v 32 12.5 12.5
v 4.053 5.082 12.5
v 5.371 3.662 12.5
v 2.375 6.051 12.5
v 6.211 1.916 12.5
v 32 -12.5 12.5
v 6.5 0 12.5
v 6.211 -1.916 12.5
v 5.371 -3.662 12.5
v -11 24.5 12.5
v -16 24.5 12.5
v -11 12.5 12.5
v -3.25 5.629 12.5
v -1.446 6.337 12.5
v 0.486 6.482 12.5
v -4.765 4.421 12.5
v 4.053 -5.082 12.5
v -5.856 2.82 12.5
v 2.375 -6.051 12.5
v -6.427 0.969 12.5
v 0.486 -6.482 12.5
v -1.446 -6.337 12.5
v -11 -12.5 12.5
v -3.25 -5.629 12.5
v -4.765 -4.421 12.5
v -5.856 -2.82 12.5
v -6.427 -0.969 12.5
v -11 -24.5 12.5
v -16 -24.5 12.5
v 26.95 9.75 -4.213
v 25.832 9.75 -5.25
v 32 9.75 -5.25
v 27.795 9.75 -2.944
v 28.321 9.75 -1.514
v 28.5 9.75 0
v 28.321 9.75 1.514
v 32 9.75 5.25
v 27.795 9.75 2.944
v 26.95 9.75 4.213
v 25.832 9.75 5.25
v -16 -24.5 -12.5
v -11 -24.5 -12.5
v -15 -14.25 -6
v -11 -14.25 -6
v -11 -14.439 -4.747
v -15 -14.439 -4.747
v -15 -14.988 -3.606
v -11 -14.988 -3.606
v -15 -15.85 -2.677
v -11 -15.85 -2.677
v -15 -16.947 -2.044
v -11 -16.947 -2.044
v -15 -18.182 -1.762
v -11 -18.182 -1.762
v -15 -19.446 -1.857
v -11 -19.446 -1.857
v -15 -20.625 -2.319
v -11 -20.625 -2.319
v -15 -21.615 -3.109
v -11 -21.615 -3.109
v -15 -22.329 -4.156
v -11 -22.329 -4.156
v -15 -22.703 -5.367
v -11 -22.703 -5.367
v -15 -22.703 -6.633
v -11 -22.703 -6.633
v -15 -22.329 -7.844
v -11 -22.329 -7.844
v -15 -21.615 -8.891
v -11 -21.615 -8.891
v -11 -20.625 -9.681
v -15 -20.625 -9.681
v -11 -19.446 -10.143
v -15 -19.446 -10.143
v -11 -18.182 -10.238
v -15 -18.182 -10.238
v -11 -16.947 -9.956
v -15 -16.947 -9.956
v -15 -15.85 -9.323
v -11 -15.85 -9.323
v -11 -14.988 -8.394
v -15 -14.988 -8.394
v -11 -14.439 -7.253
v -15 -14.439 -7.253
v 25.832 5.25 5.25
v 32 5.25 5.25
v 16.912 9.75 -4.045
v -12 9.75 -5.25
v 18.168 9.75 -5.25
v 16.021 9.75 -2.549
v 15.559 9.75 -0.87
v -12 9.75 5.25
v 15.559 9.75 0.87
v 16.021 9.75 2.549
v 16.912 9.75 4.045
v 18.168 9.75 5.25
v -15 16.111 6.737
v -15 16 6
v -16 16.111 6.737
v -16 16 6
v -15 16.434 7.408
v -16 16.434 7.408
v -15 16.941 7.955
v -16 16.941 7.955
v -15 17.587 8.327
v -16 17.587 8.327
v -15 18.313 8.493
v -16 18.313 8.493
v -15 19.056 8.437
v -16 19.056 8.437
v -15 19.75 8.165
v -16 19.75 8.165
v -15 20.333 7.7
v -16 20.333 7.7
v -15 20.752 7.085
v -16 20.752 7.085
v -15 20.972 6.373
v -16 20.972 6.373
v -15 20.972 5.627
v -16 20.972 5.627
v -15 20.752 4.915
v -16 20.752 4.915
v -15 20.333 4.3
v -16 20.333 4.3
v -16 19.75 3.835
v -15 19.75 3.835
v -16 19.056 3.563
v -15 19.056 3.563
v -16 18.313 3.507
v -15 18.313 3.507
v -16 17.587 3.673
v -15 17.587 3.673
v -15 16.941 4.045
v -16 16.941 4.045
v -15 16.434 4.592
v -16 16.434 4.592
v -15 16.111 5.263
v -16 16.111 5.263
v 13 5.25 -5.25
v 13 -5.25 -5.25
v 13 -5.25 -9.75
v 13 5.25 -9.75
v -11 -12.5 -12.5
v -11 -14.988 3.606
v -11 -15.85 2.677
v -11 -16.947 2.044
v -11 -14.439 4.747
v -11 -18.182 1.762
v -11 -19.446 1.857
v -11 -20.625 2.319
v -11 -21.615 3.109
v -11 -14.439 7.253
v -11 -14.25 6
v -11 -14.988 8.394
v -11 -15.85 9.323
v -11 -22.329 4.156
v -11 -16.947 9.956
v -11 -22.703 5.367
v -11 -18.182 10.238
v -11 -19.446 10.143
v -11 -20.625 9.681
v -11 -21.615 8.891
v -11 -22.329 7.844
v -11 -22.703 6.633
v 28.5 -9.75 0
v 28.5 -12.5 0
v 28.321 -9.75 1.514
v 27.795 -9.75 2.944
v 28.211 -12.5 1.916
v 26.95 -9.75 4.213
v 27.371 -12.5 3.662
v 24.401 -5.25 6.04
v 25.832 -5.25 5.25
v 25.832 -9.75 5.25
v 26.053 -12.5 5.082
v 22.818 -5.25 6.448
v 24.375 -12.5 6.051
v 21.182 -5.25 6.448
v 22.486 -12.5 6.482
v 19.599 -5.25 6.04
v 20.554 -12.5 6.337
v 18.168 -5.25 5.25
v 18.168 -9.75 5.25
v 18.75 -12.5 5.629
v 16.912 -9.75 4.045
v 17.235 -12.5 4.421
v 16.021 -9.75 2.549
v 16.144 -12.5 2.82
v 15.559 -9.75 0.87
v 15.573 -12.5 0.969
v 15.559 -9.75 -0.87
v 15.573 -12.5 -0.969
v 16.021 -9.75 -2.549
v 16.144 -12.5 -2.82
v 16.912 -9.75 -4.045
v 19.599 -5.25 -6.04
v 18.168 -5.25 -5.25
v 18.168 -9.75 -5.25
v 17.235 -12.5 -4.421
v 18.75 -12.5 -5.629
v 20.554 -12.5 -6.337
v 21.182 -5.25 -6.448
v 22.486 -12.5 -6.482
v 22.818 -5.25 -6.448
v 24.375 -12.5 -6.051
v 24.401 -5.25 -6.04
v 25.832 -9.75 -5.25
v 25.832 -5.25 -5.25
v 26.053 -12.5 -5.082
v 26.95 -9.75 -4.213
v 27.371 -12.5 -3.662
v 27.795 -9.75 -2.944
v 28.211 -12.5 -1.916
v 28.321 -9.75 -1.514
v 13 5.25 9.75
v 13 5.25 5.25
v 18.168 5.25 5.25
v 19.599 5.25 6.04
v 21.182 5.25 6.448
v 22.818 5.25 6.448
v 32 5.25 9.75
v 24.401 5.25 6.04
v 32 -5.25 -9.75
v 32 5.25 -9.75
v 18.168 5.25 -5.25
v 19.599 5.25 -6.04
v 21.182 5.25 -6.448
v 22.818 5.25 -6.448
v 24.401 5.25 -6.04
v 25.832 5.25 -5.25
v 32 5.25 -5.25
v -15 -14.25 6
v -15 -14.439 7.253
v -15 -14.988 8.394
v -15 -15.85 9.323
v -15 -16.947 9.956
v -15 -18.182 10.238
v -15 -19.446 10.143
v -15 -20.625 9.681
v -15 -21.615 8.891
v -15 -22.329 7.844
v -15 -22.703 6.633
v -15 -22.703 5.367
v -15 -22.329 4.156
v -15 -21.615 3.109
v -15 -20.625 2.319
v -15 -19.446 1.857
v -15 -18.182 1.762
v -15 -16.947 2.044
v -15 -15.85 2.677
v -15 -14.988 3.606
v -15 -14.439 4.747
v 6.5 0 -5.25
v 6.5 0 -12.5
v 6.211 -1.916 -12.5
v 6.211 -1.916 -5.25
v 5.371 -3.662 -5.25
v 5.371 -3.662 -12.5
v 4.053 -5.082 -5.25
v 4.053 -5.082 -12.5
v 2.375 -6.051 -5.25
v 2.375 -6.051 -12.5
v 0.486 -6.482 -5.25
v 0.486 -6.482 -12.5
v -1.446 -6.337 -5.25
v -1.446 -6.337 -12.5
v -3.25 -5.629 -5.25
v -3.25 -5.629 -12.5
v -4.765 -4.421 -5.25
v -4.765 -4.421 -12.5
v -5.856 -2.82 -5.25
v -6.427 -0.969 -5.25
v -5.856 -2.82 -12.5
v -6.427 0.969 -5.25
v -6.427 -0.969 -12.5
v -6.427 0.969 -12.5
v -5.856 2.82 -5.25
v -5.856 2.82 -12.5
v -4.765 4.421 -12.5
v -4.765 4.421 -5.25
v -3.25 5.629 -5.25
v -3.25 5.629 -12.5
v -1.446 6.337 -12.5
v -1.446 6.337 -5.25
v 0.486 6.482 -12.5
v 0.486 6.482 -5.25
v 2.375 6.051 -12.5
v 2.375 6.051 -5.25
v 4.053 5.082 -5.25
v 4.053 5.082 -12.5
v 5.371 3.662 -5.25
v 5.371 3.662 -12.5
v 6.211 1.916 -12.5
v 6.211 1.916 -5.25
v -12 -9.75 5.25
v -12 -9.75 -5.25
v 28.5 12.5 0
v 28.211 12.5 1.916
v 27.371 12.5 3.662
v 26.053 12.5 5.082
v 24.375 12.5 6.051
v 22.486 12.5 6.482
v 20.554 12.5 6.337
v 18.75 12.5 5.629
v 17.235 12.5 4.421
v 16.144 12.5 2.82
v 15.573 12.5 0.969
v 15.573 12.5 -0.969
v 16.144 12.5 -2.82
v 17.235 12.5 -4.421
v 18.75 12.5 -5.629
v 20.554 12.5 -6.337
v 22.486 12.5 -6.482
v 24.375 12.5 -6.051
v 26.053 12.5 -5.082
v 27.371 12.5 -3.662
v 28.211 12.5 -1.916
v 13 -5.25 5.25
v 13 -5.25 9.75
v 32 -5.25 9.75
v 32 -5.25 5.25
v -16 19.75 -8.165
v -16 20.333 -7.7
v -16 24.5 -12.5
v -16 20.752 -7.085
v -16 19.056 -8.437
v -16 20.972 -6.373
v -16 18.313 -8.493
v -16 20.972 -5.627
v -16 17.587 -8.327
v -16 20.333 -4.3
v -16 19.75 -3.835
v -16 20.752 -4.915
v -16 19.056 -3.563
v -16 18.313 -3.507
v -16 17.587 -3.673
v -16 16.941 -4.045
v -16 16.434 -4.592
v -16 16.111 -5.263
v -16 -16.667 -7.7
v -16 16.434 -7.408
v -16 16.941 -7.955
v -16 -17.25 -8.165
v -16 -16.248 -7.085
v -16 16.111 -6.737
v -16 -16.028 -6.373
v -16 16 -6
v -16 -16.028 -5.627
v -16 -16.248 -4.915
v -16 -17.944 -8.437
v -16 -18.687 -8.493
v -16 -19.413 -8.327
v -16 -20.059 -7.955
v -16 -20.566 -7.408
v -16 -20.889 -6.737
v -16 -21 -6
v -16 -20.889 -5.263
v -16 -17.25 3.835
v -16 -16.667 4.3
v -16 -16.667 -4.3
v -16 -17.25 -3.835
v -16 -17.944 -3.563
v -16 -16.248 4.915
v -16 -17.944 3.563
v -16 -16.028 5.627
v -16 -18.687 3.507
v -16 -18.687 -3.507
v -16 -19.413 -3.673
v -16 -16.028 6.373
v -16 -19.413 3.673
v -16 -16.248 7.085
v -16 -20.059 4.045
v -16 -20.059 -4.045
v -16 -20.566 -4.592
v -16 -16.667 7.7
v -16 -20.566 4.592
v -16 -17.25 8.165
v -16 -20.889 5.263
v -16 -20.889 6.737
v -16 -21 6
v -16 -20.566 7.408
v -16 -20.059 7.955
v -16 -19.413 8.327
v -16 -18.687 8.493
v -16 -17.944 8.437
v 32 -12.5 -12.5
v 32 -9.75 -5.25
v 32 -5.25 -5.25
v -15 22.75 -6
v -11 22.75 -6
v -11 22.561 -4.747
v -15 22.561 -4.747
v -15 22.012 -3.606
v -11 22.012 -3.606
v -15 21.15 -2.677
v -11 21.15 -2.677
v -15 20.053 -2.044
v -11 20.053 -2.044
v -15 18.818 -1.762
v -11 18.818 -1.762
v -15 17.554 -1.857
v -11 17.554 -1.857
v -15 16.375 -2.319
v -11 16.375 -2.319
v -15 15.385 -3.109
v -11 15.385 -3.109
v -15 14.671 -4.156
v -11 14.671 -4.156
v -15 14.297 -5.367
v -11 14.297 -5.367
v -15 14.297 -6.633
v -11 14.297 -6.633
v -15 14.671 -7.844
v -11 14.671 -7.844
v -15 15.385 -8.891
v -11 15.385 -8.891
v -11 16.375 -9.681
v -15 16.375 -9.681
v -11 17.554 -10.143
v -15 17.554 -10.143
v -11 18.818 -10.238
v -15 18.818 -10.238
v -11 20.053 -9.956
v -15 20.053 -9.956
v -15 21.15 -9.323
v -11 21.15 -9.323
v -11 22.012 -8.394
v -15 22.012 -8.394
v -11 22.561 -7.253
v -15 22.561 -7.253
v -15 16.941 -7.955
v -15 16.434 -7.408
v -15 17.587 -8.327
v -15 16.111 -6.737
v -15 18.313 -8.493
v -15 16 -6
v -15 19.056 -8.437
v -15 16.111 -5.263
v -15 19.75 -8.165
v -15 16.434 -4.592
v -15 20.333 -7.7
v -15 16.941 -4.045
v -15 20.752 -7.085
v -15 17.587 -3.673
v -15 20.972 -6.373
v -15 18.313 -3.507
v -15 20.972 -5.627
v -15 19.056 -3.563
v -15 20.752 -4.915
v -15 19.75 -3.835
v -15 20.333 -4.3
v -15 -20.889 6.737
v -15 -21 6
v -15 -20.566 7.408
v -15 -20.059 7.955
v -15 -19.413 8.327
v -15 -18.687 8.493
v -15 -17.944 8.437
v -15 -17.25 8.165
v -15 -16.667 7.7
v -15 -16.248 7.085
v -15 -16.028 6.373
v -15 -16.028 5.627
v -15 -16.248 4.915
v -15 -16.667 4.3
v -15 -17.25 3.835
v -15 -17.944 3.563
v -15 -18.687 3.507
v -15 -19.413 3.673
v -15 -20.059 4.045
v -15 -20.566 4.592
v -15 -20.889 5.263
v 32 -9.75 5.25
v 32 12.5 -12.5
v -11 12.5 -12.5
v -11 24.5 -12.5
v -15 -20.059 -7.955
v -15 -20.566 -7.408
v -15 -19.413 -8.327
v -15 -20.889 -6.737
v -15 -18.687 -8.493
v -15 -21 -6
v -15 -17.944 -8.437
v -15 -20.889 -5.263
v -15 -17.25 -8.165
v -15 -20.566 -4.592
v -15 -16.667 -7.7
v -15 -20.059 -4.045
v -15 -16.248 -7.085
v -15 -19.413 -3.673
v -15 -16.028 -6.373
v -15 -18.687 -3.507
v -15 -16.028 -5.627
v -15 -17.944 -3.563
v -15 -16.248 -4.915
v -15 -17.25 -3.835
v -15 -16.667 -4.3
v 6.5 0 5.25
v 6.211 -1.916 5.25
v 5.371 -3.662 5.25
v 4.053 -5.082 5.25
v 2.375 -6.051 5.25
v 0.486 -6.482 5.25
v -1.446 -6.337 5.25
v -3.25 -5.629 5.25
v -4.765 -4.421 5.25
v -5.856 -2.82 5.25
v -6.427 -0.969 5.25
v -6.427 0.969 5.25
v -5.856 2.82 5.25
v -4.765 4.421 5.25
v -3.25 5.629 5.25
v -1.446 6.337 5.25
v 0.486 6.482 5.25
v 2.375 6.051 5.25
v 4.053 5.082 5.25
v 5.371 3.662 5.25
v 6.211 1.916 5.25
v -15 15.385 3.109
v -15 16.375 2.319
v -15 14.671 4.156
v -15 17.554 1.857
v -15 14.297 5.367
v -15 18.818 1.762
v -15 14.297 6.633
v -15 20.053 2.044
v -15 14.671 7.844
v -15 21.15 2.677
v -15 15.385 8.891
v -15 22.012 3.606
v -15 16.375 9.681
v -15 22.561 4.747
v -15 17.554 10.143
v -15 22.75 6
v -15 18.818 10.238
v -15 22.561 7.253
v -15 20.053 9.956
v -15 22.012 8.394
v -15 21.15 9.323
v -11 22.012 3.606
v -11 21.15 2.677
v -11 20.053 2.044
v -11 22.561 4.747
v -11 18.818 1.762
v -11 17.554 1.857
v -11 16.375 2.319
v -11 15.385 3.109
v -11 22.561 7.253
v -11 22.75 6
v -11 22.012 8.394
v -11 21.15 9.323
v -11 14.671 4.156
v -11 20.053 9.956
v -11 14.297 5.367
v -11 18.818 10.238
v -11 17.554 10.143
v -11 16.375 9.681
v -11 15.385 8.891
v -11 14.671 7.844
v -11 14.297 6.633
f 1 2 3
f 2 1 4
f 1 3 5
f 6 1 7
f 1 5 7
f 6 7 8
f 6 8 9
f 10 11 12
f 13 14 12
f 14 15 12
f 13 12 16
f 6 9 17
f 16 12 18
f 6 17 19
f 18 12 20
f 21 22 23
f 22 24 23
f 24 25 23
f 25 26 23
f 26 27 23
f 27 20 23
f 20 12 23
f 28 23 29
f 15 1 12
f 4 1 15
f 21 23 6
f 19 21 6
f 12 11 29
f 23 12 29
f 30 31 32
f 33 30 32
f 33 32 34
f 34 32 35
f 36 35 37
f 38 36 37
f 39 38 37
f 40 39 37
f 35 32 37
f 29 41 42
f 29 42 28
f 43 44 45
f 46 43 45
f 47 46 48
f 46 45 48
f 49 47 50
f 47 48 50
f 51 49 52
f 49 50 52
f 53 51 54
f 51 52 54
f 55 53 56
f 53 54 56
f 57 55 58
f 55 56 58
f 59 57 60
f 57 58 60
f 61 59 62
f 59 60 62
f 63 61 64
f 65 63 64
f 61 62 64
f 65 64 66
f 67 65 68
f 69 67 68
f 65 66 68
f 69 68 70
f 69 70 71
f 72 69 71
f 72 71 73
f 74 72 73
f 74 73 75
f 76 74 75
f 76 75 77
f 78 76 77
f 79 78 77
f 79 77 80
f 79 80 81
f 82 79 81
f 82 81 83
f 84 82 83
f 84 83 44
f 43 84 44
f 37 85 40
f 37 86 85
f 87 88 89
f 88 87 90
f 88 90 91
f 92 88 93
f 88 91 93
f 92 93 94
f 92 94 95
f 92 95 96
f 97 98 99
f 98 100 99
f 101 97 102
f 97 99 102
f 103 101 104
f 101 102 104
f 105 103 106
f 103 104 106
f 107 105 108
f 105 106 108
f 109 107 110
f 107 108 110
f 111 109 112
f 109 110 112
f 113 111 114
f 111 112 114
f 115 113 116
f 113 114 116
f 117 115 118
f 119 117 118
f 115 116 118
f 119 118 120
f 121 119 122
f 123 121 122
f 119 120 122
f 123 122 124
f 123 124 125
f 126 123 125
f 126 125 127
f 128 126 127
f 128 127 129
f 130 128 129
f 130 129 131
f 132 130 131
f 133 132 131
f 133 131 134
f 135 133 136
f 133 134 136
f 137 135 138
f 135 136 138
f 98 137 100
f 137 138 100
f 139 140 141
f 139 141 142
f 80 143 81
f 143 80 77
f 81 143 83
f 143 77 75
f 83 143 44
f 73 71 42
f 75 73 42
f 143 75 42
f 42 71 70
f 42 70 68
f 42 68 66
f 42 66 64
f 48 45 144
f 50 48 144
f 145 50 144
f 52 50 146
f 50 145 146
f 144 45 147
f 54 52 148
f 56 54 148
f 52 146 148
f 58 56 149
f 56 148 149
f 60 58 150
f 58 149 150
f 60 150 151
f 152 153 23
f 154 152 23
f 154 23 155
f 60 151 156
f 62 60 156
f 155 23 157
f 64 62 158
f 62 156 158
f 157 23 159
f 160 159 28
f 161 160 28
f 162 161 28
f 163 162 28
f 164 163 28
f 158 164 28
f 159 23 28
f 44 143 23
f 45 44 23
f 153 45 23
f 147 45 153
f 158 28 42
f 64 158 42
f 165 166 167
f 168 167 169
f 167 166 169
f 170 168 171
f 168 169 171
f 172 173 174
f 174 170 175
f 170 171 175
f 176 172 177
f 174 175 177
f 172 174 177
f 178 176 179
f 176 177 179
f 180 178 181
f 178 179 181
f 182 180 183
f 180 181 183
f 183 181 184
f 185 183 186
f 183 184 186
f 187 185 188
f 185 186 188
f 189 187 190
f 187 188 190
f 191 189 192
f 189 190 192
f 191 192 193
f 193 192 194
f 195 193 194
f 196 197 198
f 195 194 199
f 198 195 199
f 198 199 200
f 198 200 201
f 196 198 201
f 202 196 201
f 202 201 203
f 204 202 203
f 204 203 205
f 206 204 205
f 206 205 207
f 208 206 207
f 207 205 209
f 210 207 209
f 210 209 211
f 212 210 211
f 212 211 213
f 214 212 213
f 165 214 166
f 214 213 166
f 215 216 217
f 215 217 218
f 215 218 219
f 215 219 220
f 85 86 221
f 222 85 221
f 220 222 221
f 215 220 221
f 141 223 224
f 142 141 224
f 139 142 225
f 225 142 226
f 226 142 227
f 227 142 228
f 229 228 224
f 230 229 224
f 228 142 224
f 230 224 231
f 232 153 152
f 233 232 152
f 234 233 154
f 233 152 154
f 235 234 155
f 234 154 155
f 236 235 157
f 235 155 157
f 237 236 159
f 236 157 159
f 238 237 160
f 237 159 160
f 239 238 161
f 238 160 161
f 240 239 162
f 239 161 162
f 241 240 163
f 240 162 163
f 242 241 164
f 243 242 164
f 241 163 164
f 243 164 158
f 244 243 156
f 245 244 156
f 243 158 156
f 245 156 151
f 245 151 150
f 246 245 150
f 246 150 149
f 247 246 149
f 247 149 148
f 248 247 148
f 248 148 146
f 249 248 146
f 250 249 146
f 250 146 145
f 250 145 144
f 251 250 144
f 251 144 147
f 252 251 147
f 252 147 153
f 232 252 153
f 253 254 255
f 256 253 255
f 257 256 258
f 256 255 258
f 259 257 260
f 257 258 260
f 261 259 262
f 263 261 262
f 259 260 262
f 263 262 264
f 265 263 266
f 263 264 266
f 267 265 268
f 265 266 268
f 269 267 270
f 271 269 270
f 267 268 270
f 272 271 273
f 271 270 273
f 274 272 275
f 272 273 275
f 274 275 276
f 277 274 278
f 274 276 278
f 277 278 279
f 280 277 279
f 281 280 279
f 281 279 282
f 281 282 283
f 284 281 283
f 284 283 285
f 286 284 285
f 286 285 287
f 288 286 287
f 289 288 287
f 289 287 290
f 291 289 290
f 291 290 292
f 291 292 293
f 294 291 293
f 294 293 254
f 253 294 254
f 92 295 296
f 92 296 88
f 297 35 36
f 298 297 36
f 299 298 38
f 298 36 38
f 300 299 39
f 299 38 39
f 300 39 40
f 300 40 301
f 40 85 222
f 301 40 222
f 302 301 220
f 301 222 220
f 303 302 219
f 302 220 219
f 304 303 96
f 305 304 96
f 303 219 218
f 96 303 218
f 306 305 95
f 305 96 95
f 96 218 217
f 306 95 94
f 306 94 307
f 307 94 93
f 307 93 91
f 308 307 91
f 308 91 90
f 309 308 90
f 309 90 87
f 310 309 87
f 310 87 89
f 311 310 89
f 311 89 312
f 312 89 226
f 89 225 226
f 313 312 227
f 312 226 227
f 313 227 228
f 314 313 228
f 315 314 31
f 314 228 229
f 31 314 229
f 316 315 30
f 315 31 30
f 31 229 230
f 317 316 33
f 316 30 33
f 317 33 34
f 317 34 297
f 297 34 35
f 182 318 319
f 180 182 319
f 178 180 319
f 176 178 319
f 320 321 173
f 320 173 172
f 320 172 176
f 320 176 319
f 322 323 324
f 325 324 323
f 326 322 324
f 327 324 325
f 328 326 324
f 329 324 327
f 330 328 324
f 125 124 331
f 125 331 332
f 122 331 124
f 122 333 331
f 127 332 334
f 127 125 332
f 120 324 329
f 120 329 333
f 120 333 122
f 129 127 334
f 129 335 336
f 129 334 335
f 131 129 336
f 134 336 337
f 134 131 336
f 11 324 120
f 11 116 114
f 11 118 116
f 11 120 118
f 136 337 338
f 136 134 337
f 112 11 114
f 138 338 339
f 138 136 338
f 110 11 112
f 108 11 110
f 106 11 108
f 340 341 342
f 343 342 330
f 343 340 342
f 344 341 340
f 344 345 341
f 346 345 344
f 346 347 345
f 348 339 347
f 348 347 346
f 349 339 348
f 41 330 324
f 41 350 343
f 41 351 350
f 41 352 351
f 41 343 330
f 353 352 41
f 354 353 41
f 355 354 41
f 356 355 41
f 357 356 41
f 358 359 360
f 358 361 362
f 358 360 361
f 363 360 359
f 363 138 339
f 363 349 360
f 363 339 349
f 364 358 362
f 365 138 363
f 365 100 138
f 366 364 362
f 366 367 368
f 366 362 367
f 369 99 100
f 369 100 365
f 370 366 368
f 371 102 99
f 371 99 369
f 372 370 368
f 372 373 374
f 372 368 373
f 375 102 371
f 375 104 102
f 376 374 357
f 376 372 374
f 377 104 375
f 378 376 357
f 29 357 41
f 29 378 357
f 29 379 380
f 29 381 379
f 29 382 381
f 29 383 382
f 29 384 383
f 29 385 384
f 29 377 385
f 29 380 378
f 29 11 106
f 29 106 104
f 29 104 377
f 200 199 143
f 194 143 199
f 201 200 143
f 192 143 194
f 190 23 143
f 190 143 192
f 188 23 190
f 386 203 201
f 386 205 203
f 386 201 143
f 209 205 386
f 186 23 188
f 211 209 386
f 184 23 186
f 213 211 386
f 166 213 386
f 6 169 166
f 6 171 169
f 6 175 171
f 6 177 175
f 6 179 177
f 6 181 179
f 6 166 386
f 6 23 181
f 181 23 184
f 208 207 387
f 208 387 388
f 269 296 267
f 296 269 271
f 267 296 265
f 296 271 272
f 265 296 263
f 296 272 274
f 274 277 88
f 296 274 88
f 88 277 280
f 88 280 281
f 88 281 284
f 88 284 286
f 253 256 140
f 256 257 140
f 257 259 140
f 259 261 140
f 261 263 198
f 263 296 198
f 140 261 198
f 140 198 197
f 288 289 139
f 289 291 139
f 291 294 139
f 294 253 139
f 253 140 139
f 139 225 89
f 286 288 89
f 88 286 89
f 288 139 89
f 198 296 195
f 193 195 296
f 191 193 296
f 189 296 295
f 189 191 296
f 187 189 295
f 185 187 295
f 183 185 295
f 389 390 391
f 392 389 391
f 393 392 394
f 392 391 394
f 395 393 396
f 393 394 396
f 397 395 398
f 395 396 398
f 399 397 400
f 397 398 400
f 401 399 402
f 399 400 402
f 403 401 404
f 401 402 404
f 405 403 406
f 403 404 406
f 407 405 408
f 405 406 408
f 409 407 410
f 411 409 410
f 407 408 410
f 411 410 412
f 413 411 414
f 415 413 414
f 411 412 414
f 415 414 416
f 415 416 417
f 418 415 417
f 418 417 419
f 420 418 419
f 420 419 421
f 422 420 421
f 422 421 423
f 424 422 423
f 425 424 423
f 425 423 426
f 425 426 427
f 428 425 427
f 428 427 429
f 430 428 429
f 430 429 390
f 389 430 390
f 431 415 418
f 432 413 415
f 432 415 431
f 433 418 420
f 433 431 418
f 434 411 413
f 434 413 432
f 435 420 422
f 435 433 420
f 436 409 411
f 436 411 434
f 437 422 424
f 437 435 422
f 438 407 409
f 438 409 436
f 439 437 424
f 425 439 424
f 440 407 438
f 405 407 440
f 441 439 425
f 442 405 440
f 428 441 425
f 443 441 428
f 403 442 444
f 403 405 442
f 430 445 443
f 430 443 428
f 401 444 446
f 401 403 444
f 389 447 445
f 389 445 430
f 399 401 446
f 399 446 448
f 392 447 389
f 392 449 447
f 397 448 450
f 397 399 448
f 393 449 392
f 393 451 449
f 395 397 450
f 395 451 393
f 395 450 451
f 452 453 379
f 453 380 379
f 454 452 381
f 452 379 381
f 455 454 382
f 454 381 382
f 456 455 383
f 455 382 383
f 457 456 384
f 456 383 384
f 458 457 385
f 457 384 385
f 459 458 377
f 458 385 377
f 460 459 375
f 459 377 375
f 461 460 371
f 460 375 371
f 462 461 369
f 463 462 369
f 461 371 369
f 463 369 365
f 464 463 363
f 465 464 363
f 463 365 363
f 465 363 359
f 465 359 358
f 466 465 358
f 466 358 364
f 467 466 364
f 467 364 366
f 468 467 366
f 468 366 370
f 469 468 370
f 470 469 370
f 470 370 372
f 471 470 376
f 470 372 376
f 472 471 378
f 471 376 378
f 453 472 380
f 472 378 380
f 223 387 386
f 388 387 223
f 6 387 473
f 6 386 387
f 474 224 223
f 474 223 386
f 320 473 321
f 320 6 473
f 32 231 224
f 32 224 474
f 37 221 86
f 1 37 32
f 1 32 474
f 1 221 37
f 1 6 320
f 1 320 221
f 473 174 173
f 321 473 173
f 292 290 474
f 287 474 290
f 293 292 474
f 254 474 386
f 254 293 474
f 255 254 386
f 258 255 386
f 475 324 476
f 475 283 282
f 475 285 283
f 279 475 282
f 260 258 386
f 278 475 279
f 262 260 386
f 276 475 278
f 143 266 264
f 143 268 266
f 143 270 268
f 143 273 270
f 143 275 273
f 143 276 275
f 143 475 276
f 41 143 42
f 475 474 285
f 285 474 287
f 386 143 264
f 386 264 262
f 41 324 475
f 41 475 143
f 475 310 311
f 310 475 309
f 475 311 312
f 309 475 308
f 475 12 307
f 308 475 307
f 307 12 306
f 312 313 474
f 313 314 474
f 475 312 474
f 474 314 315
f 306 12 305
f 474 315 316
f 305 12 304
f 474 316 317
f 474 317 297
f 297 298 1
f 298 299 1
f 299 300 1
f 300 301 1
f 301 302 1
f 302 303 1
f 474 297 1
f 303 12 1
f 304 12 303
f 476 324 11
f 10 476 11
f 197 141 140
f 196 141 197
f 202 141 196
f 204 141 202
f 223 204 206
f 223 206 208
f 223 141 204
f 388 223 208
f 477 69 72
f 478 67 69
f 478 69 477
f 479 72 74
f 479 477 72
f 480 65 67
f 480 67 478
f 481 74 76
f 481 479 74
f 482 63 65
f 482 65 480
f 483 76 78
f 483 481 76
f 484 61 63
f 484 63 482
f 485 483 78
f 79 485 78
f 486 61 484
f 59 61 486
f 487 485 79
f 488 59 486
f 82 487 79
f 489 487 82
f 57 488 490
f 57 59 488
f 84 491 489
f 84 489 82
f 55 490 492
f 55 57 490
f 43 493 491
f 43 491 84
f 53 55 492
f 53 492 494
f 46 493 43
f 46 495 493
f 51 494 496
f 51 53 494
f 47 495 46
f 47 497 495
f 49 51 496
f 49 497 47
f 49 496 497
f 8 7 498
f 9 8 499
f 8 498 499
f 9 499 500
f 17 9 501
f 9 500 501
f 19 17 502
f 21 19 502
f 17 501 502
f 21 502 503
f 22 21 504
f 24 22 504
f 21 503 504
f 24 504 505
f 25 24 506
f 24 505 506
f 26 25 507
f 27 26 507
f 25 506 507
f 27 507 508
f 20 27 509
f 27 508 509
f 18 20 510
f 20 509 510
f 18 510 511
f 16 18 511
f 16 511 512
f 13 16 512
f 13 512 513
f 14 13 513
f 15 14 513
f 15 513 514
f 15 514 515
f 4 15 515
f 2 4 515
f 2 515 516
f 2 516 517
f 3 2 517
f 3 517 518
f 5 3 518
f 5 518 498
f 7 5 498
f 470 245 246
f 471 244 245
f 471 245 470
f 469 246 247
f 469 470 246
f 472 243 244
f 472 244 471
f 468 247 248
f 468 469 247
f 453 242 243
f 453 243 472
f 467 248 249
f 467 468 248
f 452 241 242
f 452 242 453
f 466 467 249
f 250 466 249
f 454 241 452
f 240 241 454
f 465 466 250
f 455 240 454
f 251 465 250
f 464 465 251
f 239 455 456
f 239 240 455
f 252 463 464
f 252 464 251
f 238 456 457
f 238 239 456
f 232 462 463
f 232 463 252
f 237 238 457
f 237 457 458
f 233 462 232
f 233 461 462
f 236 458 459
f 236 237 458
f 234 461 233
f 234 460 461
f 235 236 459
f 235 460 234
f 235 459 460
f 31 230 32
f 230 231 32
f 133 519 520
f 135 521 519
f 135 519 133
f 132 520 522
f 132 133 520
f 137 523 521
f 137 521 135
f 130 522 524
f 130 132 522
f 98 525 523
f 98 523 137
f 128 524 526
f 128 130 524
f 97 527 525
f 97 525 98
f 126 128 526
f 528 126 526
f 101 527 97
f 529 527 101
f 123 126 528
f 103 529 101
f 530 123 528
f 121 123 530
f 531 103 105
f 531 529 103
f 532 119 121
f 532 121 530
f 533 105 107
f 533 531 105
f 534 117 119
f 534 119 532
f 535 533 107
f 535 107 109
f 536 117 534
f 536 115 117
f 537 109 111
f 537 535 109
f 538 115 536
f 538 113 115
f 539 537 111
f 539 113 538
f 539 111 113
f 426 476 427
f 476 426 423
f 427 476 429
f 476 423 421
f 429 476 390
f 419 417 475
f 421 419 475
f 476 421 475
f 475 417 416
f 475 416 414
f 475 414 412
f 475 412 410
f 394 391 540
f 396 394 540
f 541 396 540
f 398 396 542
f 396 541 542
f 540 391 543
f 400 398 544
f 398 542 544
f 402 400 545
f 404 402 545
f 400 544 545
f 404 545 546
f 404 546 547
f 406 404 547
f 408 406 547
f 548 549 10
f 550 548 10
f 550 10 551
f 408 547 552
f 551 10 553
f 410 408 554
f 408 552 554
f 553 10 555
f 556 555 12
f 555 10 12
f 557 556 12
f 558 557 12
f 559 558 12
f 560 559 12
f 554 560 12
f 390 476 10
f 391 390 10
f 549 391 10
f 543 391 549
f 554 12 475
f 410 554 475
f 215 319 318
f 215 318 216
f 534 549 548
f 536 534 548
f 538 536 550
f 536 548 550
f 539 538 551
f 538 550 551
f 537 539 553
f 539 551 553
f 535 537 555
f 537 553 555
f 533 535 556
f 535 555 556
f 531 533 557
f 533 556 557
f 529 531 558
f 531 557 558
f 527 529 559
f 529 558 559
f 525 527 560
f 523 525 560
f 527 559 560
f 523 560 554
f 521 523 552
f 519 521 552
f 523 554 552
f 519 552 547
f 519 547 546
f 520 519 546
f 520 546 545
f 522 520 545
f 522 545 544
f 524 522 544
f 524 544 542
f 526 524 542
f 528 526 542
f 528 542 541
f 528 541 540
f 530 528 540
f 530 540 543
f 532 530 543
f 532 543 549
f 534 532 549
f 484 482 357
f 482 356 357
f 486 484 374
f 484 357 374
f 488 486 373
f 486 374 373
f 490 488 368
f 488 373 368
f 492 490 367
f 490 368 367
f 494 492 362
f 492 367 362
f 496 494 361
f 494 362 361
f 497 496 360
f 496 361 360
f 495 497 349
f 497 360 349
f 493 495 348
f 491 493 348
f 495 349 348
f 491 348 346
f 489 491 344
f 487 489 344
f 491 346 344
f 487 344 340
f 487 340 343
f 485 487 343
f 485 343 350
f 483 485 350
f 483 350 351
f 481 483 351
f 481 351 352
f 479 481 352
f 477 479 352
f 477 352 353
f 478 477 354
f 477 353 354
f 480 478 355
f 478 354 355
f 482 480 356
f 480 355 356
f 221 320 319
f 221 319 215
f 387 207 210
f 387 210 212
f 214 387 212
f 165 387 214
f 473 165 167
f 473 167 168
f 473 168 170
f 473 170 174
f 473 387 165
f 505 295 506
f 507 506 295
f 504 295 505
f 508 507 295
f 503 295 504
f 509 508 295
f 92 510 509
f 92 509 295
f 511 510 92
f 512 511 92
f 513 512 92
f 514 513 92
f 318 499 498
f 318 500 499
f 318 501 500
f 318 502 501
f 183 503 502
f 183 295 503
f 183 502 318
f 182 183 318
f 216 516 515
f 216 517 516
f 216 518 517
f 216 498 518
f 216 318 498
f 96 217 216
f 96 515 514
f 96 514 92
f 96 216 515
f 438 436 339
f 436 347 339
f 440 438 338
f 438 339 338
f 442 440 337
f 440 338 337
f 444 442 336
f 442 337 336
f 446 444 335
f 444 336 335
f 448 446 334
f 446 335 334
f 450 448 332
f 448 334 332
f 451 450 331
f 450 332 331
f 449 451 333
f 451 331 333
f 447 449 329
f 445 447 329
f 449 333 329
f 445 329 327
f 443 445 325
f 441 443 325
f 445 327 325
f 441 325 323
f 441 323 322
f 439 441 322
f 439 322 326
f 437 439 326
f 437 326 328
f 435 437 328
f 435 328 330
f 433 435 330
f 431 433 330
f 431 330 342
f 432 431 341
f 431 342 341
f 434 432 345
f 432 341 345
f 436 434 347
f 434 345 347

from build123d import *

# Parameters (mm, degrees)
F0_W            = 48
F0_H            = 25
F1_DEPTH        = 12.5
F2_W            = 19.5
F2_H            = 10.5
F3_DEPTH        = 44
F4_R            = 6.5
F5_DEPTH        = 25.001
F6_W            = 10.5
F6_H            = 19.5
F7_DEPTH        = 19
F8_R            = 6.5
F9_DEPTH        = 25.001
F10_W           = 12
F10_H           = 25
F11_DEPTH       = 5
F13_D           = 5
F13_CBORE_D     = 8.5
F13_CBORE_DEPTH = 4


with BuildPart() as f1:
    # F0 (on Top) → F1 (new body, symmetric)
    with BuildSketch(Plane.XY):
        with Locations((8, 0)):
            Rectangle(F0_W, F0_H)
    extrude(amount=F1_DEPTH, both=True)

    # F2 (on face) → F3 (cut)
    with BuildSketch(Plane.YZ.offset(32)):
        Rectangle(F2_W, F2_H)
    extrude(amount=-F3_DEPTH, mode=Mode.SUBTRACT)

    # F4 (on face) → F5 (cut, through all)
    with BuildSketch(Plane(origin=(0, 0, -12.5), x_dir=(1, 0, 0), z_dir=(0, 0, -1))):
        Circle(F4_R)
    extrude(amount=-F5_DEPTH, mode=Mode.SUBTRACT)

    # F6 (on face) → F7 (cut)
    with BuildSketch(Plane.YZ.offset(32)):
        Rectangle(F6_W, F6_H)
    extrude(amount=-F7_DEPTH, mode=Mode.SUBTRACT)

    # F8 (on face) → F9 (cut, through all)
    with BuildSketch(Plane.XZ.offset(12.5)):
        with Locations((22, 0)):
            Circle(F8_R)
    extrude(amount=-F9_DEPTH, mode=Mode.SUBTRACT)

    # F10 (on face) → F11 (join)
    with BuildSketch(Plane(origin=(-16, 0, 0), x_dir=(0, -1, 0), z_dir=(-1, 0, 0))):
        with Locations((-18.5, 0)):
            Rectangle(F10_W, F10_H)
        with Locations((18.5, 0)):
            Rectangle(F10_W, F10_H)
    extrude(amount=-F11_DEPTH)

    # F13 (through all)
    with Locations(Plane.YZ.offset(-11)):
        with Locations((-18.5, 6), (-18.5, -6), (18.5, 6), (18.5, -6)):
            CounterBoreHole(F13_D / 2, F13_CBORE_D / 2, F13_CBORE_DEPTH)


solid = f1.part
